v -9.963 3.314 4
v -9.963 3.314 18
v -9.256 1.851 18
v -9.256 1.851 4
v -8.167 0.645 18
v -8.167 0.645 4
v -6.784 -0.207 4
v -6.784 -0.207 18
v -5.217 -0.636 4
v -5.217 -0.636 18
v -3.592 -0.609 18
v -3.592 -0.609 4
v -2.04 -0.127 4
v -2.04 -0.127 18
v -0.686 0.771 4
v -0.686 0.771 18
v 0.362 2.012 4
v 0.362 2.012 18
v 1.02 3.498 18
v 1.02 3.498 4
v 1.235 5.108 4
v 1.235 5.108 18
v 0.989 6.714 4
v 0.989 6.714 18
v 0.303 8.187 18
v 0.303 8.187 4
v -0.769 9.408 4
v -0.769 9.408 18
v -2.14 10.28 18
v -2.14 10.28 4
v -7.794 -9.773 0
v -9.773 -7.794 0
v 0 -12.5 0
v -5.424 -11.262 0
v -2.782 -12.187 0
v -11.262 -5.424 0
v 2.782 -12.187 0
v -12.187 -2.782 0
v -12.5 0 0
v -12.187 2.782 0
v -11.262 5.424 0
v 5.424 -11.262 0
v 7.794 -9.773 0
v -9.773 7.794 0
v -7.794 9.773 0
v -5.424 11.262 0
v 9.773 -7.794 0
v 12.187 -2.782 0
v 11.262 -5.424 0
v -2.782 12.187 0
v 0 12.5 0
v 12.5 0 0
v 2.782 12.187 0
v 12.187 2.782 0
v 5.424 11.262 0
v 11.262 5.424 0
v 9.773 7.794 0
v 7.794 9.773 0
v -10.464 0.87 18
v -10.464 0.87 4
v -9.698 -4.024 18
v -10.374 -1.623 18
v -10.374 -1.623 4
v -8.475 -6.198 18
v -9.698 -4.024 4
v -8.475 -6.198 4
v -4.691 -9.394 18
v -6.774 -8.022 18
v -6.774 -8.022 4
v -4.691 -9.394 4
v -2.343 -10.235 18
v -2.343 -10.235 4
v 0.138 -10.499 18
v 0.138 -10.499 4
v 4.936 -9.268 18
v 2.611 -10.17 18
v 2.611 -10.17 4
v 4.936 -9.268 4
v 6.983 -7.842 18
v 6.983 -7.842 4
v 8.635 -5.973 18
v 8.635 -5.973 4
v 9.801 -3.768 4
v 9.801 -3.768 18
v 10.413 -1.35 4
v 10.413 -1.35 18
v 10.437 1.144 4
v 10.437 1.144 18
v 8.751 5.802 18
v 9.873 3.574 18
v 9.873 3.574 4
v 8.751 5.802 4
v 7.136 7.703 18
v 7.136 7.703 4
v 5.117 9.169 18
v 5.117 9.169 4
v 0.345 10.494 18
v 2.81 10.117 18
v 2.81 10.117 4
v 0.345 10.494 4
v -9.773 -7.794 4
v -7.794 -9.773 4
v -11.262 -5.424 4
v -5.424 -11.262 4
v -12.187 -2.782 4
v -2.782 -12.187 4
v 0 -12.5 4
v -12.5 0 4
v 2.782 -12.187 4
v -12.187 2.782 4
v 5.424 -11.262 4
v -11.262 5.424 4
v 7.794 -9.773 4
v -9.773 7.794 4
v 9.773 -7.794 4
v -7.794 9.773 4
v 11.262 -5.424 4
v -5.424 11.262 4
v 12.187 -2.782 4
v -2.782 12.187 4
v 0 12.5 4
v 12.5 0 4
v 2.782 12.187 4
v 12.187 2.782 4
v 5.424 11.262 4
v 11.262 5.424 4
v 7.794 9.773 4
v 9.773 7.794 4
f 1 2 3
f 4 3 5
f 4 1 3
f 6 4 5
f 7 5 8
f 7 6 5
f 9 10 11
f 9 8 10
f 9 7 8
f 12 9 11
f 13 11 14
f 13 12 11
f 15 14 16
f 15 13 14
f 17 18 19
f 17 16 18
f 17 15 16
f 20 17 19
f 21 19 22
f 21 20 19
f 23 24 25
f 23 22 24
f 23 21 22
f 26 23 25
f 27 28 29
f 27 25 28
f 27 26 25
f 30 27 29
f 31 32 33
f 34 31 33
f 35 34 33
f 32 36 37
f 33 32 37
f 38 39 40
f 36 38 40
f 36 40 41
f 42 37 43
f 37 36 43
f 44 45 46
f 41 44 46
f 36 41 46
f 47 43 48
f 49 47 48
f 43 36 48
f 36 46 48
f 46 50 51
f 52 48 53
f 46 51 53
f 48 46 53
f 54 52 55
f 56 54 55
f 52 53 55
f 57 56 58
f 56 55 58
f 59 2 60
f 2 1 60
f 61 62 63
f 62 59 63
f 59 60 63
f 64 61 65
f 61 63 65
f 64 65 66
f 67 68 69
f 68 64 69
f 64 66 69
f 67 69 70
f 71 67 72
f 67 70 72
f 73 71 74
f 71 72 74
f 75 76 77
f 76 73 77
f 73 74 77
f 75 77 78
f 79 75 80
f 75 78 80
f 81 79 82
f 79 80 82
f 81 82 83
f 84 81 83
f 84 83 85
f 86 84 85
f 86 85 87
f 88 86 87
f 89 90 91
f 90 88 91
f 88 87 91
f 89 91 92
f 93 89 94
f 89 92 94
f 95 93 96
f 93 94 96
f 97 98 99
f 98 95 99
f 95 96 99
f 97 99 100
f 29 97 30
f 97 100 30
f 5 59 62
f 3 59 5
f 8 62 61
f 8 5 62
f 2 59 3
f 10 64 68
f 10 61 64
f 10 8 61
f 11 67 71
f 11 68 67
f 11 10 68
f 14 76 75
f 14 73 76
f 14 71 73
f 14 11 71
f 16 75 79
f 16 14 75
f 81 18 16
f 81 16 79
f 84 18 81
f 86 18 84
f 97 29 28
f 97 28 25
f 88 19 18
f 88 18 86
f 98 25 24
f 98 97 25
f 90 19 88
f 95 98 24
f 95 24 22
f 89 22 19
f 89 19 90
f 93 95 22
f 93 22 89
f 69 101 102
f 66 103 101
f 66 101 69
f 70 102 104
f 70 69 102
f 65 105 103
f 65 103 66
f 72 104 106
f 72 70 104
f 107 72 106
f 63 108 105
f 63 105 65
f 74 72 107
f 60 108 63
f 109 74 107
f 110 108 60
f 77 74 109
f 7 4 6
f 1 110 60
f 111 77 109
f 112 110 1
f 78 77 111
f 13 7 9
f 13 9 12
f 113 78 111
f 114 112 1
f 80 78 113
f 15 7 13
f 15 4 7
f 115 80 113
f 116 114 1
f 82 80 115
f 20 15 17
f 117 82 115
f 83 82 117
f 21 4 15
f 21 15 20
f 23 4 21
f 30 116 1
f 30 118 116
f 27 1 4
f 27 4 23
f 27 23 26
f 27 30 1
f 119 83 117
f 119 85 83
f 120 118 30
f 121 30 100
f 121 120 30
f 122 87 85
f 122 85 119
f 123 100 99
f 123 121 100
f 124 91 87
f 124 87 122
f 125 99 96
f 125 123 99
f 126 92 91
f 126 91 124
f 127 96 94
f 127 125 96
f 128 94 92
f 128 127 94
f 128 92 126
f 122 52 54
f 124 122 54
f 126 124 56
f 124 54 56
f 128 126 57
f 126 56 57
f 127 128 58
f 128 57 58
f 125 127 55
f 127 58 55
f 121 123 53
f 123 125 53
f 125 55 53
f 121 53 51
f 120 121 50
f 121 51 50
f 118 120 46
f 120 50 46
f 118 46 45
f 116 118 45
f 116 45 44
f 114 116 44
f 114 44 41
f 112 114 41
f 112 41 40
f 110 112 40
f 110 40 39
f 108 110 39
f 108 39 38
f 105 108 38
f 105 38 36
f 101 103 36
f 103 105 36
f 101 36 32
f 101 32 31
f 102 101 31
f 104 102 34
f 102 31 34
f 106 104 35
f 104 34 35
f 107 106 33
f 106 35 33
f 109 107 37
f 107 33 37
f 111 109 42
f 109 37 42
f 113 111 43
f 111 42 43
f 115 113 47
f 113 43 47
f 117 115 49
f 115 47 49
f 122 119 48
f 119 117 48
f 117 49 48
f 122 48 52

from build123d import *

# Parameters (mm, degrees)
F0_R     = 12.5
F1_DEPTH = 4
F2_R     = 10.5
F3_DEPTH = 14
F4_R     = 5.734203
F5_DEPTH = 14


with BuildPart() as f1:
    # F0 (on Top) → F1 (new body)
    with BuildSketch(Plane.XY):
        Circle(F0_R)
    extrude(amount=F1_DEPTH)

    # F2 (on face) → F3 (join)
    with BuildSketch(Plane.XY.offset(4)):
        Circle(F2_R)
    extrude(amount=F3_DEPTH)

    # F4 (on face) → F5 (cut)
    with BuildSketch(Plane.XY.offset(4)):
        with Locations((-4.499399, 5.053002)):
            Circle(F4_R)
    extrude(amount=F5_DEPTH, mode=Mode.SUBTRACT)


solid = f1.part
